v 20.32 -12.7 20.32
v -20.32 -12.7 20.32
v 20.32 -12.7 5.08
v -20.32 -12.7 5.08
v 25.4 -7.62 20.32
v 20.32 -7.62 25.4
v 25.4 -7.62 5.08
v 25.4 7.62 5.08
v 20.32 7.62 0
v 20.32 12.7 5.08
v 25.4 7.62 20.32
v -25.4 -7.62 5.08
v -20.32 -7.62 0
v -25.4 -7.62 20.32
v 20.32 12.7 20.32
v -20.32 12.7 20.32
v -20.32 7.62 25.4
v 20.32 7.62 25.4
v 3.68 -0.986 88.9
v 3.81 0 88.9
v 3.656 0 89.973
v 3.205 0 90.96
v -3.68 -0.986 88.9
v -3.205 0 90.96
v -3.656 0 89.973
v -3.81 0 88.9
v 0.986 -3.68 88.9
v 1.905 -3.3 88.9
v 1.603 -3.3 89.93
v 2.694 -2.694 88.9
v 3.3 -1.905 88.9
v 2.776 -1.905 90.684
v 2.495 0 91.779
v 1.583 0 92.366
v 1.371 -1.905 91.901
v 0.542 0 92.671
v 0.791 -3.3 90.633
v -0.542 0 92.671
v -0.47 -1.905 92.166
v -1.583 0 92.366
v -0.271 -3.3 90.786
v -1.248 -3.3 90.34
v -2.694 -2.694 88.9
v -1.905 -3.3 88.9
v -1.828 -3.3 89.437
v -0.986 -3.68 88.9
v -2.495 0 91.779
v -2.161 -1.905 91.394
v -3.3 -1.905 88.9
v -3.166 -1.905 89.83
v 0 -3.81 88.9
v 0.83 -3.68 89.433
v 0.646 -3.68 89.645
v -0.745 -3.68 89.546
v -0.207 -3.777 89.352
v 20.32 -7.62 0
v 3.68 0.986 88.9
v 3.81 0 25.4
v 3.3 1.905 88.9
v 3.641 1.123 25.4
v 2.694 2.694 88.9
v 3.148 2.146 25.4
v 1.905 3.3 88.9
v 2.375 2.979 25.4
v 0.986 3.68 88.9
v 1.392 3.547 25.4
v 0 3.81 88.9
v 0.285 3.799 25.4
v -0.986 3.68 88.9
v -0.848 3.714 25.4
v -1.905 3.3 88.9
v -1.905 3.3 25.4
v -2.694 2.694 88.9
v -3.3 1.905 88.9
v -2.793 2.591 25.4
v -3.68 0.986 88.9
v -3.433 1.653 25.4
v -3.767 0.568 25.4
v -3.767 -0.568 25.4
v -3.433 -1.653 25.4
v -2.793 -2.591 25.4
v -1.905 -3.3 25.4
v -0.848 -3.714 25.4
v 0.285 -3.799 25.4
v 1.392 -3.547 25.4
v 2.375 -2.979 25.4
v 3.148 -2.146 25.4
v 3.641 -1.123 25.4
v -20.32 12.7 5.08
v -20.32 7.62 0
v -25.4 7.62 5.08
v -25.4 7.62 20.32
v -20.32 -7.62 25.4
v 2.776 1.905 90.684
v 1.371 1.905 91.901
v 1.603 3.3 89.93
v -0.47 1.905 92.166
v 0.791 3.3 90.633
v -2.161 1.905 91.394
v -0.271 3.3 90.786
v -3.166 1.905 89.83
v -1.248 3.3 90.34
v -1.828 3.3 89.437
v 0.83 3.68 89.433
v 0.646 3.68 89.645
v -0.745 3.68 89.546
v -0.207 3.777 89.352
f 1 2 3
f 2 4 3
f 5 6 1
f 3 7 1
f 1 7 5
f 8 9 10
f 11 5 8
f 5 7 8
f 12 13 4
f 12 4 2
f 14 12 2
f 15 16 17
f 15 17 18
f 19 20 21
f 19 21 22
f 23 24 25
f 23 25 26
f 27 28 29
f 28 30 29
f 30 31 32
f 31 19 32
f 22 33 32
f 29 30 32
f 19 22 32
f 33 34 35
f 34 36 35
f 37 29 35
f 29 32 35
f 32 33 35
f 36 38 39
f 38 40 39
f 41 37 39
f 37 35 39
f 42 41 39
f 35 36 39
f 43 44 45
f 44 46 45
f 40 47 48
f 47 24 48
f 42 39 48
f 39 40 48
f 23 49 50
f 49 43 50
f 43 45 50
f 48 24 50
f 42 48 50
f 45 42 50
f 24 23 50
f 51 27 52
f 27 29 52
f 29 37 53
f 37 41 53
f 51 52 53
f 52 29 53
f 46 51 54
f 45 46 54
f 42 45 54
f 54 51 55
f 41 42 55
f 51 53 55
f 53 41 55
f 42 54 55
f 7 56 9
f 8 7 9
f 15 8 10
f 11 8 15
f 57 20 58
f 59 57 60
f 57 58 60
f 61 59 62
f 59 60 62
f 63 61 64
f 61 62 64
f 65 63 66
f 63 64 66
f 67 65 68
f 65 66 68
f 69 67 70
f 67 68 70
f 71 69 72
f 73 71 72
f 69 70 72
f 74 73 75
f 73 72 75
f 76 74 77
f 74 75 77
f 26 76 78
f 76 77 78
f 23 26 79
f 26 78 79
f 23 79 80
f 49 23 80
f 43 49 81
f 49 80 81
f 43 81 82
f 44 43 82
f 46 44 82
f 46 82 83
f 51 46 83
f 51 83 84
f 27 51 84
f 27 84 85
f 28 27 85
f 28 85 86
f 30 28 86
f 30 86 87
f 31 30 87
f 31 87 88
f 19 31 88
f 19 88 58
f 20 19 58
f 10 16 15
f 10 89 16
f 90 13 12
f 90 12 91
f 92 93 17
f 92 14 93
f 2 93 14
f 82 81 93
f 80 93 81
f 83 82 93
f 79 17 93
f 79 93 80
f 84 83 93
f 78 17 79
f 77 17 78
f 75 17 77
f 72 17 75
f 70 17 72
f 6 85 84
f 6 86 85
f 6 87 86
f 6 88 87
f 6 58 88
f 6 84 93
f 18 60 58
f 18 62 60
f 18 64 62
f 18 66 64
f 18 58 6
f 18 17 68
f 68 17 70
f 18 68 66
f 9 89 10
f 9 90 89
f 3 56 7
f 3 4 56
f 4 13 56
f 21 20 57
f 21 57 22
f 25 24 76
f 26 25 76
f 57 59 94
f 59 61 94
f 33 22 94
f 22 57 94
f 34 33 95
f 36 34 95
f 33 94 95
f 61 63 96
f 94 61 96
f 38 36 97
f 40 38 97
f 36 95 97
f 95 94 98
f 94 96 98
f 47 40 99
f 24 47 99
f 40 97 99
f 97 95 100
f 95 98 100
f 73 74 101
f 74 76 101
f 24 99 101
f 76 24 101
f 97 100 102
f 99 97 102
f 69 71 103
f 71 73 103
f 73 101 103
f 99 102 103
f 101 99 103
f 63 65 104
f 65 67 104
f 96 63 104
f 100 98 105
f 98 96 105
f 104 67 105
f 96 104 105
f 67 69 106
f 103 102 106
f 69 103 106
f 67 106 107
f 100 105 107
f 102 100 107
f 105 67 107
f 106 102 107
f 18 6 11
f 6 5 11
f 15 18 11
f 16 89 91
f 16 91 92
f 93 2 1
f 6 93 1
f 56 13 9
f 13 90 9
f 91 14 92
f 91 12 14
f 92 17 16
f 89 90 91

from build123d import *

# Parameters (mm, degrees)
F0_W     = 50.8
F0_H     = 25.4
F1_DEPTH = 25.4
F2_R     = 3.81
F3_DEPTH = 63.5
F6_SIZE  = 5.08


with BuildPart() as f1:
    # F0 (on Top) → F1 (new body)
    with BuildSketch(Plane.XY):
        Rectangle(F0_W, F0_H)
    extrude(amount=F1_DEPTH)

    # F2 (on face) → F3 (join)
    with BuildSketch(Plane.XY.offset(25.4)):
        Circle(F2_R)
    extrude(amount=F3_DEPTH)

    # F4 (on face) → F5 (revolve)
    with BuildSketch(Plane.XY.offset(88.9)):
        with BuildLine():
            Line((0, 3.81), (0, -3.81))
            ThreePointArc((0, -3.81), (2.694077, -2.694077), (3.81, 0))
            ThreePointArc((3.81, 0), (2.694077, 2.694077), (0, 3.81))
        make_face()
    revolve(axis=Axis((0, 0, 88.9), (0, -1, 0)))

    # F6
    f6_edges = [f1.edges().sort_by_distance(p)[0] for p in [
        (-25.4, 0, 25.4),
        (25.4, 0, 25.4),
        (0, -12.7, 25.4),
        (0, 12.7, 25.4),
        (0, -12.7, 0),
        (0, 12.7, 0),
        (-25.4, 0, 0),
        (25.4, 0, 0),
        (25.4, -12.7, 12.7),
        (25.4, 12.7, 12.7),
        (-25.4, 12.7, 12.7),
        (-25.4, -12.7, 12.7),
    ]]
    chamfer(f6_edges, length=F6_SIZE)


solid = f1.part
